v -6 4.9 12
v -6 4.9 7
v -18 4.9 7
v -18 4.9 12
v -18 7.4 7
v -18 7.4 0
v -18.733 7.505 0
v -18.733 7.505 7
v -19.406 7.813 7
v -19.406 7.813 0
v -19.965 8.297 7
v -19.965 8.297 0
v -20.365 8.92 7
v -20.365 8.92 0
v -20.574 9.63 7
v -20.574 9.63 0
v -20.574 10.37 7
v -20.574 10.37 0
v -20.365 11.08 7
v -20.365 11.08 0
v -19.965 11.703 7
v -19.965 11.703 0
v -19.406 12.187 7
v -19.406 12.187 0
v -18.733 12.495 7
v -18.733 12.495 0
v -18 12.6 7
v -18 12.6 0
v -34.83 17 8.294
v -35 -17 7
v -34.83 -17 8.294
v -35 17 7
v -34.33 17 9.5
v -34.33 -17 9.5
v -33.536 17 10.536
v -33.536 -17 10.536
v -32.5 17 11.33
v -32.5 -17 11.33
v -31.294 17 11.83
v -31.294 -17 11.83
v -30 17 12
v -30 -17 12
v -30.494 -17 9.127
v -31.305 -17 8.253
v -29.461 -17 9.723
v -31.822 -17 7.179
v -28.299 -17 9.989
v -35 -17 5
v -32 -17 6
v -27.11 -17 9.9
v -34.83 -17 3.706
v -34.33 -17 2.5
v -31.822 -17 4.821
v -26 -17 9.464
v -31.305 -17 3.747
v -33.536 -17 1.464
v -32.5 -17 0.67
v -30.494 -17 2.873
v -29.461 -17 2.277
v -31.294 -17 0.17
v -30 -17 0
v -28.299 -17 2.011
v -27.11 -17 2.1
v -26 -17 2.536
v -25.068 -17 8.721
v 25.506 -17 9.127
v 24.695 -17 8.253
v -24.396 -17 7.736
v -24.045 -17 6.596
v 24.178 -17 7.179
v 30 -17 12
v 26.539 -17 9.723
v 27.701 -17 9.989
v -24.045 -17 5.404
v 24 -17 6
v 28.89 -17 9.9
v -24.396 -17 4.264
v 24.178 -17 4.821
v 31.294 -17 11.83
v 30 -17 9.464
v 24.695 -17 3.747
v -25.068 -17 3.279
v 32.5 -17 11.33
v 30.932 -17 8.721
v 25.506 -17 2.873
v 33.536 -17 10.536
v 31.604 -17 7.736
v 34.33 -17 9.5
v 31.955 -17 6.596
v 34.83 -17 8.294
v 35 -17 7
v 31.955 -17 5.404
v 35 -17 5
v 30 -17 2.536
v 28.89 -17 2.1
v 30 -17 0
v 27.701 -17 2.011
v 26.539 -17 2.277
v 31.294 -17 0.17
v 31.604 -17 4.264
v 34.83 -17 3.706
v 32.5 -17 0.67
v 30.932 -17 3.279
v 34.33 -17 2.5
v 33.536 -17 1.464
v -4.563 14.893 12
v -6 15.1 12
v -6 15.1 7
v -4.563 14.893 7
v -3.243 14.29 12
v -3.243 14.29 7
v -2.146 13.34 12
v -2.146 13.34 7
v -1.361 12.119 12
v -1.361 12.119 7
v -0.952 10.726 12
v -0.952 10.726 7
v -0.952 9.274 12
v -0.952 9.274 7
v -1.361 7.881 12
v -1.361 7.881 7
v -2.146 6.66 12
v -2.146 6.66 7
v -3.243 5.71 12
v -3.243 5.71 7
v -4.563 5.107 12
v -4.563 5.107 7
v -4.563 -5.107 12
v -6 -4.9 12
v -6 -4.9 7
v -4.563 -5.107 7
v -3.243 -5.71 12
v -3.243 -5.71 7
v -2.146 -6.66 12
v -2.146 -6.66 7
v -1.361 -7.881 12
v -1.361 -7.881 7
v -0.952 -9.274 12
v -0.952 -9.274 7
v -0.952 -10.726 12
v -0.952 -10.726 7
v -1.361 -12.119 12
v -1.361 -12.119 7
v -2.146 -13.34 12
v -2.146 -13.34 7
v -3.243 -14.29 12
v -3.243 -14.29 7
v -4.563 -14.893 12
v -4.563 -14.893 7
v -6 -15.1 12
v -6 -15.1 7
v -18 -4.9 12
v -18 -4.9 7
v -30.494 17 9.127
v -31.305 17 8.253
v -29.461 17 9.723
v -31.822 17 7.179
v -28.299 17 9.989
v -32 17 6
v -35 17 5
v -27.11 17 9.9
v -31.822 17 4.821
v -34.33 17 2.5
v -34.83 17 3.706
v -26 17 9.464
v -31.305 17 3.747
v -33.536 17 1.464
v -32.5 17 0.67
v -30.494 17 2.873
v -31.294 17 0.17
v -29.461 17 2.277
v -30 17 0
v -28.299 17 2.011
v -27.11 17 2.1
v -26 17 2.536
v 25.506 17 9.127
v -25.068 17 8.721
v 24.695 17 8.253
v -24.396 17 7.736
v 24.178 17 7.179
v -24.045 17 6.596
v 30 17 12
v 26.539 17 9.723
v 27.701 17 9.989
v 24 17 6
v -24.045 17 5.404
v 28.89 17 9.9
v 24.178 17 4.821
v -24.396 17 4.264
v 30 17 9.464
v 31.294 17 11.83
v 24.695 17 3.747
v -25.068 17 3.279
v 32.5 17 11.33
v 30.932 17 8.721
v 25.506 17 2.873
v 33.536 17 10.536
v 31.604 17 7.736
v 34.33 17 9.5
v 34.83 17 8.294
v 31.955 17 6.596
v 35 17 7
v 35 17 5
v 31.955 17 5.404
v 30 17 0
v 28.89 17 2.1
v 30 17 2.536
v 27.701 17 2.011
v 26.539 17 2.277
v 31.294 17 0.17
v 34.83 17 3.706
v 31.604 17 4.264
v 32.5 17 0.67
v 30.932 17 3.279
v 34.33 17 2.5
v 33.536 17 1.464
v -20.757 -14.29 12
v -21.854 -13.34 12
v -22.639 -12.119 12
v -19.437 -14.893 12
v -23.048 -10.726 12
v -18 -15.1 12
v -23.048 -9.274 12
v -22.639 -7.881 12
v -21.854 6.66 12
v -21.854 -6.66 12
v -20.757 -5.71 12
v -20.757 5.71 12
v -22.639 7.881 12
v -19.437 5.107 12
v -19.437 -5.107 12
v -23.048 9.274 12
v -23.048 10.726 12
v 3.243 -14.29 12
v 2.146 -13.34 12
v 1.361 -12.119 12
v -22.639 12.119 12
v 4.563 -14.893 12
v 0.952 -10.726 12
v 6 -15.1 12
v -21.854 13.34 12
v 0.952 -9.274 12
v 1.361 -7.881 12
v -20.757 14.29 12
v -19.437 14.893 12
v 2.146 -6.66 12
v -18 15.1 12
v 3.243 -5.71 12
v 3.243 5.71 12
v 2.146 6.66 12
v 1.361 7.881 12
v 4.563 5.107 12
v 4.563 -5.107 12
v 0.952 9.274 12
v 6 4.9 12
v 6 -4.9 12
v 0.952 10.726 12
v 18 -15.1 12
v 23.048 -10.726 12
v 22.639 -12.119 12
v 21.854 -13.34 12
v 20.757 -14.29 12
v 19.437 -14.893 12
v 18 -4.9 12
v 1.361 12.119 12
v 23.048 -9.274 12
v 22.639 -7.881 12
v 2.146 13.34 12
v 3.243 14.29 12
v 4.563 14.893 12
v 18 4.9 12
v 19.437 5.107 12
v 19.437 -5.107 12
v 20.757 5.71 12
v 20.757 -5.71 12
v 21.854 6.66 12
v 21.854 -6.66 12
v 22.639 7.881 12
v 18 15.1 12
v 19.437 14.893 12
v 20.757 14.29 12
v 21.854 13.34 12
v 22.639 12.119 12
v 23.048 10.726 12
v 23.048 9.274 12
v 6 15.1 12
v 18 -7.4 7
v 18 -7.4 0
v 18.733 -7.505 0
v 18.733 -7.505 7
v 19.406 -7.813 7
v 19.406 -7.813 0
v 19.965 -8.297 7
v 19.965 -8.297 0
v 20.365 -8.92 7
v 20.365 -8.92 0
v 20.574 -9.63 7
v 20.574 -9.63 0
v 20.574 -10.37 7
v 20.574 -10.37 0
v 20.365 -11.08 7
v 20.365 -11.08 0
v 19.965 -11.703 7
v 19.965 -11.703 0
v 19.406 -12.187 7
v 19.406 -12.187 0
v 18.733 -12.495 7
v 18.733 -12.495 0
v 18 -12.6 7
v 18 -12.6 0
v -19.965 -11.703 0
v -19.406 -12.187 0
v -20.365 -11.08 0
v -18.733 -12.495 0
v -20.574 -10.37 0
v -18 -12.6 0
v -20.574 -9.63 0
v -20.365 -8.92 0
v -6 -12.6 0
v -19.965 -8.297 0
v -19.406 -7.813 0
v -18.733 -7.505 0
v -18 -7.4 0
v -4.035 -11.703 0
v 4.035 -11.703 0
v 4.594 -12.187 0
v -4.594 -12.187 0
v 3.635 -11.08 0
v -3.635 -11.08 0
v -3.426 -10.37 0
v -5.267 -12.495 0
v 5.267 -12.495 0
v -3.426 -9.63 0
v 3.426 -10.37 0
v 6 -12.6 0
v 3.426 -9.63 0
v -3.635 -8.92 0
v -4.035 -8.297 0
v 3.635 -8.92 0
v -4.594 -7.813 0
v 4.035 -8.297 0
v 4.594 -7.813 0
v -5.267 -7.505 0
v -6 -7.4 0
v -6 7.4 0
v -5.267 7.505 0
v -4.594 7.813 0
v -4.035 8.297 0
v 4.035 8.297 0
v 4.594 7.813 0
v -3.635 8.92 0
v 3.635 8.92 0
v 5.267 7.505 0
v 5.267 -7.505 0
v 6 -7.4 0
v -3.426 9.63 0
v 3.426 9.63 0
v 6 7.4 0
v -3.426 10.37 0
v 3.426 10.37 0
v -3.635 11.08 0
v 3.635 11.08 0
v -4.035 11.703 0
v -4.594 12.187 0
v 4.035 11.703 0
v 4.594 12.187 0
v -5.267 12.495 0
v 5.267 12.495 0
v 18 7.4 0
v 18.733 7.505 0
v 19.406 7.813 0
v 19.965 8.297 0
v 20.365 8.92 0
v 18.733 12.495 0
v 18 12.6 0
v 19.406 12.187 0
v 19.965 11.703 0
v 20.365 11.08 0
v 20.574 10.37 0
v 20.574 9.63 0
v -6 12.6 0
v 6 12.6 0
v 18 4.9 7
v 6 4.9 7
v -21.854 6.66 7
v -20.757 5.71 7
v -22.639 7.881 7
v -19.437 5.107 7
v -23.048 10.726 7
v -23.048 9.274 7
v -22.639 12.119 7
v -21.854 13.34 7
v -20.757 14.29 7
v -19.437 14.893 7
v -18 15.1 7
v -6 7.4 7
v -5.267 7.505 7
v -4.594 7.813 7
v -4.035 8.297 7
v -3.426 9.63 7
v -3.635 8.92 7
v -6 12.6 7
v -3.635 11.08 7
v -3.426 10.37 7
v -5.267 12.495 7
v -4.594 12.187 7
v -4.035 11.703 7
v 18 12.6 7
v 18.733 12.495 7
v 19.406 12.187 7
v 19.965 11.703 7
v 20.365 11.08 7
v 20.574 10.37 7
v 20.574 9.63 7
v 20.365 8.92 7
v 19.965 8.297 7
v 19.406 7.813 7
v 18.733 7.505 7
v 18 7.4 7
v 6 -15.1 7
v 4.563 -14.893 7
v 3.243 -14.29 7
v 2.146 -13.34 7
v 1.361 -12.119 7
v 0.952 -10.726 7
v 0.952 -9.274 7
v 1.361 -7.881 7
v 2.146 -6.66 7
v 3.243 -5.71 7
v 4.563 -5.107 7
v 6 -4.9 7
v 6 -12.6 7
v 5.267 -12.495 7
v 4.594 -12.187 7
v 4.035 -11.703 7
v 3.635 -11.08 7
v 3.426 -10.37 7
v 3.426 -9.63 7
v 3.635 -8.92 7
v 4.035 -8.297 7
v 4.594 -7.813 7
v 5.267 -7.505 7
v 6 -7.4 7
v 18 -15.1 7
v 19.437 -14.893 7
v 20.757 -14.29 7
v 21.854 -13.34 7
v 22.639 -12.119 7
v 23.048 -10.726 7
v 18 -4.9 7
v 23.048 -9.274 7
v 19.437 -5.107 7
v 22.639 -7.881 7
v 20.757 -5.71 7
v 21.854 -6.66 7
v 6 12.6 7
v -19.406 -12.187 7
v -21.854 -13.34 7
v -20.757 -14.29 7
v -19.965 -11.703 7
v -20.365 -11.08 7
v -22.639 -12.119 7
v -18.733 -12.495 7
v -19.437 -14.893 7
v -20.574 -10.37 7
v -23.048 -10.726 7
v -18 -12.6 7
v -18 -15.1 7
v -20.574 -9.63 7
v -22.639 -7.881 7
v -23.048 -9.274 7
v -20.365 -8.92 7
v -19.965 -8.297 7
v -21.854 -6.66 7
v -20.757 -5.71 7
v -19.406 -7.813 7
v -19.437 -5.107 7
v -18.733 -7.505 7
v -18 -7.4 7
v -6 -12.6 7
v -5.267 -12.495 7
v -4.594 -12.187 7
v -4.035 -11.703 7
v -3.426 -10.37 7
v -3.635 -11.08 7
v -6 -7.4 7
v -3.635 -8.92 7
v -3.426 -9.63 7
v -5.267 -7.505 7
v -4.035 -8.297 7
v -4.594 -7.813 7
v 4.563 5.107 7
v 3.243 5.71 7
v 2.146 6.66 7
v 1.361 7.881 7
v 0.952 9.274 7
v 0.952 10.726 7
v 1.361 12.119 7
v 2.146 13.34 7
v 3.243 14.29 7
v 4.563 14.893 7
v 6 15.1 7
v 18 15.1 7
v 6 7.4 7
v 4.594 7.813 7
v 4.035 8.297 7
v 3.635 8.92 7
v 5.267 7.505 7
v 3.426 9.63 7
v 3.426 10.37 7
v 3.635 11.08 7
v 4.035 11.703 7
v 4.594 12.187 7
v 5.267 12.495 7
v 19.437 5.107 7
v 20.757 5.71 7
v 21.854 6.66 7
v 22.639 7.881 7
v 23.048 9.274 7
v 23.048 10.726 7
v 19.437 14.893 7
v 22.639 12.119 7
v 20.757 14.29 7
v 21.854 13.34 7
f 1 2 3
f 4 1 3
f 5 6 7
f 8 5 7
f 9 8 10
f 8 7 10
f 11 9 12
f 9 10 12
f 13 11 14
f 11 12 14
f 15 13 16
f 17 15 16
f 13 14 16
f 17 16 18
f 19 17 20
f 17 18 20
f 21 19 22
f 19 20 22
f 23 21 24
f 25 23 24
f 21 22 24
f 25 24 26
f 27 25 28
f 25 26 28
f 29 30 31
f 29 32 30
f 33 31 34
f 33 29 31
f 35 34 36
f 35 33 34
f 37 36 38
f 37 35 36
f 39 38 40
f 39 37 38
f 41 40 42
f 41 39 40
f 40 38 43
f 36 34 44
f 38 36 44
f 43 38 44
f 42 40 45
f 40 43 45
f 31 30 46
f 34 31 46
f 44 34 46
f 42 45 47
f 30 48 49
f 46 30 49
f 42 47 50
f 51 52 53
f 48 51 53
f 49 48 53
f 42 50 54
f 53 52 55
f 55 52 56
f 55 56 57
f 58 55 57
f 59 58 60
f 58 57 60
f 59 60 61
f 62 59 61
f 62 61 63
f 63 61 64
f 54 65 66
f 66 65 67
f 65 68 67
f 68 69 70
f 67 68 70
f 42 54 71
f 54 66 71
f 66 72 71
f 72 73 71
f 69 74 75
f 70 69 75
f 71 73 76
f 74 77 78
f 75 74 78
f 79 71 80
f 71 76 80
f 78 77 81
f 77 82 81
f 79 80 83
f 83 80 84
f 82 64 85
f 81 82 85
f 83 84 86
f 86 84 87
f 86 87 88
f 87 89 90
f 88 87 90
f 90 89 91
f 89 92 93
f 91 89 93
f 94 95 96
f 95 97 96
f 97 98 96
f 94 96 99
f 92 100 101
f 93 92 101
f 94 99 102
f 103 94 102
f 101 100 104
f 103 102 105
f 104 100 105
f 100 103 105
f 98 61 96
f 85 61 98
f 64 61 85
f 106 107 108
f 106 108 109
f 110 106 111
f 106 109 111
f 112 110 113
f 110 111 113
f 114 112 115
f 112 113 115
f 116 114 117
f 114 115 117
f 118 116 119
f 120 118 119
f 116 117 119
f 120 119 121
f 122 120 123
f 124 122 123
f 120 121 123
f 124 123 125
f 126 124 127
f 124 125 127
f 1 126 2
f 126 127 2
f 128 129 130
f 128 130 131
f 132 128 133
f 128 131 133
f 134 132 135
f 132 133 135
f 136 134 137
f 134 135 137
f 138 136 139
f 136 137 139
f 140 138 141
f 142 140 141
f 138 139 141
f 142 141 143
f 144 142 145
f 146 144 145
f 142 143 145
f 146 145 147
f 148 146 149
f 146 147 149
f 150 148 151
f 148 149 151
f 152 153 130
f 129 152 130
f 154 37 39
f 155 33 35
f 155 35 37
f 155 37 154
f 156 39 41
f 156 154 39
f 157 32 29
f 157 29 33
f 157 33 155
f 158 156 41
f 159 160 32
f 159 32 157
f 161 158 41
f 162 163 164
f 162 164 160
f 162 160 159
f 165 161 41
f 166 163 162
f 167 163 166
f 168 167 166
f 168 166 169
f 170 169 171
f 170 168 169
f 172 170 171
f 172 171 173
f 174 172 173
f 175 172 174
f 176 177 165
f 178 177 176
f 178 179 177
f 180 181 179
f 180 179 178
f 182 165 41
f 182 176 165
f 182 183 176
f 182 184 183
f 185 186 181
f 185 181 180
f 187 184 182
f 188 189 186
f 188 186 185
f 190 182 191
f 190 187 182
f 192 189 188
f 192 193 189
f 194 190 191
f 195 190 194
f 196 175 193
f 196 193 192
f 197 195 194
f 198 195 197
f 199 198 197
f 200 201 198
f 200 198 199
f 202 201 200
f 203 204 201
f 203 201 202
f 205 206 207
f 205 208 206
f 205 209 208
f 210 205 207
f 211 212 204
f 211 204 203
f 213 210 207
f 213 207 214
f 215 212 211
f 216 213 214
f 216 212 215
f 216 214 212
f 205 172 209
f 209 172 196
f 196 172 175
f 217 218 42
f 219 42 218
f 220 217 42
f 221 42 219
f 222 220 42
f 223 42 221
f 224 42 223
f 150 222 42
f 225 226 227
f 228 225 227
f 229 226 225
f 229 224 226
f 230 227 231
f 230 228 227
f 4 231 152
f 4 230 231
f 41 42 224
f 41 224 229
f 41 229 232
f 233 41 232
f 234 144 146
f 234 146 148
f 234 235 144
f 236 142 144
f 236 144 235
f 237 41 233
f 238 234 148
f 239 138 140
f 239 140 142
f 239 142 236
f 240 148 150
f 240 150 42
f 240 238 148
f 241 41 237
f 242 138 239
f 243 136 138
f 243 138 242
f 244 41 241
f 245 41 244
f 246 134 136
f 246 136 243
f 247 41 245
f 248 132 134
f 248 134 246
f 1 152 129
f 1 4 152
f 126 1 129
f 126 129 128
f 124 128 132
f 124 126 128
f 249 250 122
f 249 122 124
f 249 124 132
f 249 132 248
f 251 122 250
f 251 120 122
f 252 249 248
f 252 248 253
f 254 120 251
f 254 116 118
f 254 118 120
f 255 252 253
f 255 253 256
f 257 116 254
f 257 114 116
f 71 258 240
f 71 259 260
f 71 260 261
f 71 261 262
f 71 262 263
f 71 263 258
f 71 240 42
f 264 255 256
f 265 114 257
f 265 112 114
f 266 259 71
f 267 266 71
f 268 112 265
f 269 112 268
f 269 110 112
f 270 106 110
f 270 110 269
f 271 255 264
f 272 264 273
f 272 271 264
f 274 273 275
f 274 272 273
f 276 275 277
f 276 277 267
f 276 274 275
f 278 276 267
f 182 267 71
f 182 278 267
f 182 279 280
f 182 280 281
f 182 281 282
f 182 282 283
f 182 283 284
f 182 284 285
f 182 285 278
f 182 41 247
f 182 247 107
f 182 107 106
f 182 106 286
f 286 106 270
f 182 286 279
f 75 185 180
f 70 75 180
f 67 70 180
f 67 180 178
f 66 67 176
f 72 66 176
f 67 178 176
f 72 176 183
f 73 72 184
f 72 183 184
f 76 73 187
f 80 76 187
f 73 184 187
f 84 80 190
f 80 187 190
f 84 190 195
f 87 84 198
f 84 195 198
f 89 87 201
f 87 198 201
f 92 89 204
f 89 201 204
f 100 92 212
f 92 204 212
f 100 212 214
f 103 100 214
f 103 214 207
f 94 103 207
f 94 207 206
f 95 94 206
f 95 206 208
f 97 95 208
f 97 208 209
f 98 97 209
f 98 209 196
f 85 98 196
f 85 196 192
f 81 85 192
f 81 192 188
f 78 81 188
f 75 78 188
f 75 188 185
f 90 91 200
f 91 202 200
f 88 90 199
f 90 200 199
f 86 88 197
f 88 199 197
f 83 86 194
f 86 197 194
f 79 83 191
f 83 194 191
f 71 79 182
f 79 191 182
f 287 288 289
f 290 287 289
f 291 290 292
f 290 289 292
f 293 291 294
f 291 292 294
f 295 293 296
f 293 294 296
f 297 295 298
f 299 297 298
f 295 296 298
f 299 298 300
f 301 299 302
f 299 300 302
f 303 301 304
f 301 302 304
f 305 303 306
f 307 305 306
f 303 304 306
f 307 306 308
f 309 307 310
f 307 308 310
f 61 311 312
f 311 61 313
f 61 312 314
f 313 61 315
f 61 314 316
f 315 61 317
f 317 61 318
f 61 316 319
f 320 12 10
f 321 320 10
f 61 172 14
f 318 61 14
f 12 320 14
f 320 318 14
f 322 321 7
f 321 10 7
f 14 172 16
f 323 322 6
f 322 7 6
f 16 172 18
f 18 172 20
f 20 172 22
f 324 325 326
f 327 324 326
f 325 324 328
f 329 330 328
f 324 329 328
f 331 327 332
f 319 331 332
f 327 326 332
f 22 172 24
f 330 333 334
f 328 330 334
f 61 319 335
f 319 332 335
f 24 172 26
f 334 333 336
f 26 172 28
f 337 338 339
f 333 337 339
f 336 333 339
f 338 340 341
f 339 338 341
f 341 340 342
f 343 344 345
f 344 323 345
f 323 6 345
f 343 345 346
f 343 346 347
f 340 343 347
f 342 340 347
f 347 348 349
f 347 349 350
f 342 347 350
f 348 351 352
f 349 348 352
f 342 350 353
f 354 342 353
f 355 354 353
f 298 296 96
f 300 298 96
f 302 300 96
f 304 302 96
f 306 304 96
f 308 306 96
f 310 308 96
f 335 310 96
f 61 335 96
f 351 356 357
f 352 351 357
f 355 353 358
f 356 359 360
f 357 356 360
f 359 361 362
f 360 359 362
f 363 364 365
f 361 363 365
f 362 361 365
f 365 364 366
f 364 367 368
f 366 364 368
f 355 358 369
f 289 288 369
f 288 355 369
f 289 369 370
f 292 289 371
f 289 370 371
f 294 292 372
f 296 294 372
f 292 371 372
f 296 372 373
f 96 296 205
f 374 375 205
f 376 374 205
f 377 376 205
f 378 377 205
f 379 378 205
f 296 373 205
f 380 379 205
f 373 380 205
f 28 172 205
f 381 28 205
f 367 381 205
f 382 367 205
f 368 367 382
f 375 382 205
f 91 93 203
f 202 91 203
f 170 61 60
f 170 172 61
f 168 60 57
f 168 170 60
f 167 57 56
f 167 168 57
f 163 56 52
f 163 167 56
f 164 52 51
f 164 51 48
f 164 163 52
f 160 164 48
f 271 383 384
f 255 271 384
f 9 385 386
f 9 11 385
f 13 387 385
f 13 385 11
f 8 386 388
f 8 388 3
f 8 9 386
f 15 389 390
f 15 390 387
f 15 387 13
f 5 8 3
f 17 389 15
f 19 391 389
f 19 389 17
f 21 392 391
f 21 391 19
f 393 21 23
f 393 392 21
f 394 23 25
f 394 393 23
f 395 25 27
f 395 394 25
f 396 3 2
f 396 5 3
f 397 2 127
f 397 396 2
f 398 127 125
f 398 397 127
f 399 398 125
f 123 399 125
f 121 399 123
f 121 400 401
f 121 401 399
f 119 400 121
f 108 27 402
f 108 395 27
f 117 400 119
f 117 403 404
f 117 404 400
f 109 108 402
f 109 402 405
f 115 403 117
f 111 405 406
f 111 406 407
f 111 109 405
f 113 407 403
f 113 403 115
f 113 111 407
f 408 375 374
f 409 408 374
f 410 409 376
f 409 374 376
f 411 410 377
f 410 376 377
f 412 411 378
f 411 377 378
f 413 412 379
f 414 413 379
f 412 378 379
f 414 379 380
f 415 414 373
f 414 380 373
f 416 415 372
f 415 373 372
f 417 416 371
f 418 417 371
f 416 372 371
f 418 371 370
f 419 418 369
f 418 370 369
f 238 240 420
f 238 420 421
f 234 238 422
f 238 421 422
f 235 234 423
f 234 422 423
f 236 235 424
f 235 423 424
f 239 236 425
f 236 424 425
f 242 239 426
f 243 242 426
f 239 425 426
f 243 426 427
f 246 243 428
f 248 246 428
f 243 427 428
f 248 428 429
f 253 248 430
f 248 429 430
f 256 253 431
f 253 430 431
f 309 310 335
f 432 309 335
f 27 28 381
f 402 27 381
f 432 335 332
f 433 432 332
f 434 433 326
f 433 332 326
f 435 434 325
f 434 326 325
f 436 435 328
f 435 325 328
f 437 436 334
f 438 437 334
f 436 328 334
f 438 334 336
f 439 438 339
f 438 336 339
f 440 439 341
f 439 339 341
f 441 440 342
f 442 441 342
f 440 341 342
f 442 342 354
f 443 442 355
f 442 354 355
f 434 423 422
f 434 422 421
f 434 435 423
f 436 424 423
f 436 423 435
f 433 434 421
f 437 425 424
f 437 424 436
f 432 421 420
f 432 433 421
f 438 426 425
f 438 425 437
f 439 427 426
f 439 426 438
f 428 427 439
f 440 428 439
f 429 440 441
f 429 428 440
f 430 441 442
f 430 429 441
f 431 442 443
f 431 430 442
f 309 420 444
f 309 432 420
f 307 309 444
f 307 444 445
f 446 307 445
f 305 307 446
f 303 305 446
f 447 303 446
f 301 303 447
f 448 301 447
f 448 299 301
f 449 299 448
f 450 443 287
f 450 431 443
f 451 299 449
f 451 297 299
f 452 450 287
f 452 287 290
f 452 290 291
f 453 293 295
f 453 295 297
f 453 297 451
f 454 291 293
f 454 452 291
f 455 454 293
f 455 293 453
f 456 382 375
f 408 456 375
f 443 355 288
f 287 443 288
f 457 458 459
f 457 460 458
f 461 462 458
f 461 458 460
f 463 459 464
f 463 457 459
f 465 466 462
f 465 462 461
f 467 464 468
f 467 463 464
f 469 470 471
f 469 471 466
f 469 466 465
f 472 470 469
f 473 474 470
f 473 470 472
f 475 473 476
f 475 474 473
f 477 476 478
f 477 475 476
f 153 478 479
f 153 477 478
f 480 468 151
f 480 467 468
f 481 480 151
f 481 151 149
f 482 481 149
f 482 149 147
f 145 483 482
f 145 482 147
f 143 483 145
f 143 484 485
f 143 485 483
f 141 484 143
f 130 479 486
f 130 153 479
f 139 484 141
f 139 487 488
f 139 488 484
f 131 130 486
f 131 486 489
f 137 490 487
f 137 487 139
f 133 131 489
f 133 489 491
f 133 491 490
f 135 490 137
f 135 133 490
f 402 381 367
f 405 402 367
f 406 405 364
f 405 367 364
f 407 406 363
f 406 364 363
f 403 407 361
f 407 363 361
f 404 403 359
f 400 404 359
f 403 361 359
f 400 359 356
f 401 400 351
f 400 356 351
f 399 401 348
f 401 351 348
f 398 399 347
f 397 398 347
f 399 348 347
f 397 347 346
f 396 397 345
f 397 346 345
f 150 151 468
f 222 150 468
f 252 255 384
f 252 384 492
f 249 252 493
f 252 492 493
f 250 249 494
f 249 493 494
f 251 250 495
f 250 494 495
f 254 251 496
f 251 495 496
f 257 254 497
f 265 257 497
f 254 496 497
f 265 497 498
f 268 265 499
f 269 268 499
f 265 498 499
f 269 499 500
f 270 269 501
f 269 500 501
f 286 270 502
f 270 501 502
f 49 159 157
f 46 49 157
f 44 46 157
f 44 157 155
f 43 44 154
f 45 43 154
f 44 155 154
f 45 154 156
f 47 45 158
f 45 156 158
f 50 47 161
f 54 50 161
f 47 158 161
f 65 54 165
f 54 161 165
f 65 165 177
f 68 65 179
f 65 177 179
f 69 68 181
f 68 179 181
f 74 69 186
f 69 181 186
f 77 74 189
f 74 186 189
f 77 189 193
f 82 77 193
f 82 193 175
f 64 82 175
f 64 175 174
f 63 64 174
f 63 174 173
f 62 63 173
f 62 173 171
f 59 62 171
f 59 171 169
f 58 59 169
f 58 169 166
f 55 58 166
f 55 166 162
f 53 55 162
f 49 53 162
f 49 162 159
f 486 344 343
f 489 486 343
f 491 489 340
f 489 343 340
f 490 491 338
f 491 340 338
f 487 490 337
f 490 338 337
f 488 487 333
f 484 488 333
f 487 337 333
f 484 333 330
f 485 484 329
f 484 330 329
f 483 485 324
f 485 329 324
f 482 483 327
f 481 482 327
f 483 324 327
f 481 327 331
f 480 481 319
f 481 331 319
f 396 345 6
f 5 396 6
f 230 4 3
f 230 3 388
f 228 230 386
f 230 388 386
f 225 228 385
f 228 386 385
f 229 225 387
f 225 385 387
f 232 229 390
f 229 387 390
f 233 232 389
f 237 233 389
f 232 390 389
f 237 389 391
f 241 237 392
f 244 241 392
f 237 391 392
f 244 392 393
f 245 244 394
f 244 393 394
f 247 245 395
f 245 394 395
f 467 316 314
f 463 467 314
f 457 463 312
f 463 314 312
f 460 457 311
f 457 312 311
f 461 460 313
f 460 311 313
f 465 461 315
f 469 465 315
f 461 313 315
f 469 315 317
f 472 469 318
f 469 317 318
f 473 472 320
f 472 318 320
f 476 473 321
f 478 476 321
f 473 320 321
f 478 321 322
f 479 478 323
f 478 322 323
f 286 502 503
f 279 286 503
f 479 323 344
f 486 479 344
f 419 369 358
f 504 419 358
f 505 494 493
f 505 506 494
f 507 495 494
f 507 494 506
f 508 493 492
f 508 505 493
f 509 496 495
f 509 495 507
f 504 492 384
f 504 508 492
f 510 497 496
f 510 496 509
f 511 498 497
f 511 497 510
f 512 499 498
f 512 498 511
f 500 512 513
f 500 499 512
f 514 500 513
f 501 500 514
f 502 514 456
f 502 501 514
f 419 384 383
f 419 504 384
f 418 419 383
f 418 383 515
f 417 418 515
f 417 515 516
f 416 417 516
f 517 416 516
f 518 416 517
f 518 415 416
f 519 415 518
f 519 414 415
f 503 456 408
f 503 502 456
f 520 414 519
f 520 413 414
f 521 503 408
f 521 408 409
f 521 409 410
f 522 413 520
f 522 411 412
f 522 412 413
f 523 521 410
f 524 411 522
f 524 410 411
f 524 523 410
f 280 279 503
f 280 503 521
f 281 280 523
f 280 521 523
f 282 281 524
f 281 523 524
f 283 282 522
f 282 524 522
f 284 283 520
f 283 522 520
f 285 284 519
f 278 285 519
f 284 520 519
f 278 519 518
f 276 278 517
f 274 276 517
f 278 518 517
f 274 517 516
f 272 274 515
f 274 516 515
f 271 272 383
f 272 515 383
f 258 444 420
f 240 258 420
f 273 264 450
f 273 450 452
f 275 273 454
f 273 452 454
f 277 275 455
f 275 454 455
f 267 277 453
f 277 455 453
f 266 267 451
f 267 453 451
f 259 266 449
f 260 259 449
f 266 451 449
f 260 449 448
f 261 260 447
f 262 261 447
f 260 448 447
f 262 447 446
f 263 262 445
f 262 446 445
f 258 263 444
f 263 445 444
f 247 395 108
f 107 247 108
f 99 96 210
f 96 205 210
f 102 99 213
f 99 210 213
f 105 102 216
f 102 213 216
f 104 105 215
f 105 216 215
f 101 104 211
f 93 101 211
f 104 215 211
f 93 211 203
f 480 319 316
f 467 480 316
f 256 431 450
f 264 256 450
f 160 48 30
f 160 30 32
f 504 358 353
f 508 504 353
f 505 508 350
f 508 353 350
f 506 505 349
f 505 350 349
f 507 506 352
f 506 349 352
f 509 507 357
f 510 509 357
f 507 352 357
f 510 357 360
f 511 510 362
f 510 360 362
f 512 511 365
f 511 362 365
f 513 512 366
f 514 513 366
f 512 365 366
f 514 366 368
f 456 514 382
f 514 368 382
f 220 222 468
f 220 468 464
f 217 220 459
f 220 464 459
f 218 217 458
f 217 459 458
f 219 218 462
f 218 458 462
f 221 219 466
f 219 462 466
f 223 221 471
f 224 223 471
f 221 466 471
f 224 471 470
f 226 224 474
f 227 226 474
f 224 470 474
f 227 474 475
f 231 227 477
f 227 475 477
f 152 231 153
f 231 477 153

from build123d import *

# Parameters (mm, degrees)
F0_W     = 70
F0_H     = 34
F1_DEPTH = 12
F2_DEPTH = 7
F3_R     = 4
F4_DEPTH = 34.001
F5_R     = 5


# Not quite as in the source:
# - a feature names something its author has since deleted; it is built from what else it names


with BuildPart() as f1:
    # F0 (on Top) → F1 (new body)
    with BuildSketch(Plane.XY):
        Rectangle(F0_W, F0_H)
        with BuildLine():
            Line((-6, -15.1), (-18, -15.1))
            ThreePointArc((-18, -15.1), (-23.1, -10), (-18, -4.9))
            Line((-18, -4.9), (-6, -4.9))
            ThreePointArc((-6, -4.9), (-0.9, -10), (-6, -15.1))
        make_face(mode=Mode.SUBTRACT)
        with BuildLine():
            ThreePointArc((6, -15.1), (0.9, -10), (6, -4.9))
            Line((6, -4.9), (18, -4.9))
            ThreePointArc((18, -4.9), (23.1, -10), (18, -15.1))
            Line((18, -15.1), (6, -15.1))
        make_face(mode=Mode.SUBTRACT)
        with BuildLine():
            Line((-18, 15.1), (-6, 15.1))
            ThreePointArc((-6, 15.1), (-0.9, 10), (-6, 4.9))
            Line((-6, 4.9), (-18, 4.9))
            ThreePointArc((-18, 4.9), (-23.1, 10), (-18, 15.1))
        make_face(mode=Mode.SUBTRACT)
        with BuildLine():
            ThreePointArc((6, 4.9), (0.9, 10), (6, 15.1))
            Line((6, 15.1), (18, 15.1))
            ThreePointArc((18, 15.1), (23.1, 10), (18, 4.9))
            Line((18, 4.9), (6, 4.9))
        make_face(mode=Mode.SUBTRACT)
    extrude(amount=F1_DEPTH)

    # F0 (on Top) → F2 (join)
    with BuildSketch(Plane.XY):
        with BuildLine():
            ThreePointArc((-6, 4.9), (-0.9, 10), (-6, 15.1))
            Line((-6, 15.1), (-18, 15.1))
            ThreePointArc((-18, 15.1), (-23.1, 10), (-18, 4.9))
            Line((-18, 4.9), (-6, 4.9))
        make_face()
        with BuildLine():
            Line((-18, 12.6), (-6, 12.6))
            ThreePointArc((-6, 12.6), (-3.4, 10), (-6, 7.4))
            Line((-6, 7.4), (-18, 7.4))
            ThreePointArc((-18, 7.4), (-20.6, 10), (-18, 12.6))
        make_face(mode=Mode.SUBTRACT)
        with BuildLine():
            Line((18, 15.1), (6, 15.1))
            ThreePointArc((6, 15.1), (0.9, 10), (6, 4.9))
            Line((6, 4.9), (18, 4.9))
            ThreePointArc((18, 4.9), (23.1, 10), (18, 15.1))
        make_face()
        with BuildLine():
            ThreePointArc((6, 7.4), (3.4, 10), (6, 12.6))
            Line((6, 12.6), (18, 12.6))
            ThreePointArc((18, 12.6), (20.6, 10), (18, 7.4))
            Line((18, 7.4), (6, 7.4))
        make_face(mode=Mode.SUBTRACT)
        with BuildLine():
            Line((18, -4.9), (6, -4.9))
            ThreePointArc((6, -4.9), (0.9, -10), (6, -15.1))
            Line((6, -15.1), (18, -15.1))
            ThreePointArc((18, -15.1), (23.1, -10), (18, -4.9))
        make_face()
        with BuildLine():
            Line((18, -12.6), (6, -12.6))
            ThreePointArc((6, -12.6), (3.4, -10), (6, -7.4))
            Line((6, -7.4), (18, -7.4))
            ThreePointArc((18, -7.4), (20.6, -10), (18, -12.6))
        make_face(mode=Mode.SUBTRACT)
        with BuildLine():
            ThreePointArc((-18, -4.9), (-23.1, -10), (-18, -15.1))
            Line((-18, -15.1), (-6, -15.1))
            ThreePointArc((-6, -15.1), (-0.9, -10), (-6, -4.9))
            Line((-6, -4.9), (-18, -4.9))
        make_face()
        with BuildLine():
            Line((-6, -12.6), (-18, -12.6))
            ThreePointArc((-18, -12.6), (-20.6, -10), (-18, -7.4))
            Line((-18, -7.4), (-6, -7.4))
            ThreePointArc((-6, -7.4), (-3.4, -10), (-6, -12.6))
        make_face(mode=Mode.SUBTRACT)
    extrude(amount=F2_DEPTH)

    # F3 (on face) → F4 (cut, through all)
    with BuildSketch(Plane(origin=(0, 17, 0), x_dir=(-1, 0, 0), z_dir=(0, 1, 0))):
        with Locations((28, 6)):
            Circle(F3_R)
        with Locations((-28, 6)):
            Circle(F3_R)
    extrude(amount=-F4_DEPTH, mode=Mode.SUBTRACT)

    # F5
    f5_edges = [f1.edges().sort_by_distance(p)[0] for p in [
        (-35, 0, 12),
        (35, 0, 12),
        (-35, 0, 0),
        (35, 0, 0),
    ]]
    fillet(f5_edges, radius=F5_R)


solid = f1.part
